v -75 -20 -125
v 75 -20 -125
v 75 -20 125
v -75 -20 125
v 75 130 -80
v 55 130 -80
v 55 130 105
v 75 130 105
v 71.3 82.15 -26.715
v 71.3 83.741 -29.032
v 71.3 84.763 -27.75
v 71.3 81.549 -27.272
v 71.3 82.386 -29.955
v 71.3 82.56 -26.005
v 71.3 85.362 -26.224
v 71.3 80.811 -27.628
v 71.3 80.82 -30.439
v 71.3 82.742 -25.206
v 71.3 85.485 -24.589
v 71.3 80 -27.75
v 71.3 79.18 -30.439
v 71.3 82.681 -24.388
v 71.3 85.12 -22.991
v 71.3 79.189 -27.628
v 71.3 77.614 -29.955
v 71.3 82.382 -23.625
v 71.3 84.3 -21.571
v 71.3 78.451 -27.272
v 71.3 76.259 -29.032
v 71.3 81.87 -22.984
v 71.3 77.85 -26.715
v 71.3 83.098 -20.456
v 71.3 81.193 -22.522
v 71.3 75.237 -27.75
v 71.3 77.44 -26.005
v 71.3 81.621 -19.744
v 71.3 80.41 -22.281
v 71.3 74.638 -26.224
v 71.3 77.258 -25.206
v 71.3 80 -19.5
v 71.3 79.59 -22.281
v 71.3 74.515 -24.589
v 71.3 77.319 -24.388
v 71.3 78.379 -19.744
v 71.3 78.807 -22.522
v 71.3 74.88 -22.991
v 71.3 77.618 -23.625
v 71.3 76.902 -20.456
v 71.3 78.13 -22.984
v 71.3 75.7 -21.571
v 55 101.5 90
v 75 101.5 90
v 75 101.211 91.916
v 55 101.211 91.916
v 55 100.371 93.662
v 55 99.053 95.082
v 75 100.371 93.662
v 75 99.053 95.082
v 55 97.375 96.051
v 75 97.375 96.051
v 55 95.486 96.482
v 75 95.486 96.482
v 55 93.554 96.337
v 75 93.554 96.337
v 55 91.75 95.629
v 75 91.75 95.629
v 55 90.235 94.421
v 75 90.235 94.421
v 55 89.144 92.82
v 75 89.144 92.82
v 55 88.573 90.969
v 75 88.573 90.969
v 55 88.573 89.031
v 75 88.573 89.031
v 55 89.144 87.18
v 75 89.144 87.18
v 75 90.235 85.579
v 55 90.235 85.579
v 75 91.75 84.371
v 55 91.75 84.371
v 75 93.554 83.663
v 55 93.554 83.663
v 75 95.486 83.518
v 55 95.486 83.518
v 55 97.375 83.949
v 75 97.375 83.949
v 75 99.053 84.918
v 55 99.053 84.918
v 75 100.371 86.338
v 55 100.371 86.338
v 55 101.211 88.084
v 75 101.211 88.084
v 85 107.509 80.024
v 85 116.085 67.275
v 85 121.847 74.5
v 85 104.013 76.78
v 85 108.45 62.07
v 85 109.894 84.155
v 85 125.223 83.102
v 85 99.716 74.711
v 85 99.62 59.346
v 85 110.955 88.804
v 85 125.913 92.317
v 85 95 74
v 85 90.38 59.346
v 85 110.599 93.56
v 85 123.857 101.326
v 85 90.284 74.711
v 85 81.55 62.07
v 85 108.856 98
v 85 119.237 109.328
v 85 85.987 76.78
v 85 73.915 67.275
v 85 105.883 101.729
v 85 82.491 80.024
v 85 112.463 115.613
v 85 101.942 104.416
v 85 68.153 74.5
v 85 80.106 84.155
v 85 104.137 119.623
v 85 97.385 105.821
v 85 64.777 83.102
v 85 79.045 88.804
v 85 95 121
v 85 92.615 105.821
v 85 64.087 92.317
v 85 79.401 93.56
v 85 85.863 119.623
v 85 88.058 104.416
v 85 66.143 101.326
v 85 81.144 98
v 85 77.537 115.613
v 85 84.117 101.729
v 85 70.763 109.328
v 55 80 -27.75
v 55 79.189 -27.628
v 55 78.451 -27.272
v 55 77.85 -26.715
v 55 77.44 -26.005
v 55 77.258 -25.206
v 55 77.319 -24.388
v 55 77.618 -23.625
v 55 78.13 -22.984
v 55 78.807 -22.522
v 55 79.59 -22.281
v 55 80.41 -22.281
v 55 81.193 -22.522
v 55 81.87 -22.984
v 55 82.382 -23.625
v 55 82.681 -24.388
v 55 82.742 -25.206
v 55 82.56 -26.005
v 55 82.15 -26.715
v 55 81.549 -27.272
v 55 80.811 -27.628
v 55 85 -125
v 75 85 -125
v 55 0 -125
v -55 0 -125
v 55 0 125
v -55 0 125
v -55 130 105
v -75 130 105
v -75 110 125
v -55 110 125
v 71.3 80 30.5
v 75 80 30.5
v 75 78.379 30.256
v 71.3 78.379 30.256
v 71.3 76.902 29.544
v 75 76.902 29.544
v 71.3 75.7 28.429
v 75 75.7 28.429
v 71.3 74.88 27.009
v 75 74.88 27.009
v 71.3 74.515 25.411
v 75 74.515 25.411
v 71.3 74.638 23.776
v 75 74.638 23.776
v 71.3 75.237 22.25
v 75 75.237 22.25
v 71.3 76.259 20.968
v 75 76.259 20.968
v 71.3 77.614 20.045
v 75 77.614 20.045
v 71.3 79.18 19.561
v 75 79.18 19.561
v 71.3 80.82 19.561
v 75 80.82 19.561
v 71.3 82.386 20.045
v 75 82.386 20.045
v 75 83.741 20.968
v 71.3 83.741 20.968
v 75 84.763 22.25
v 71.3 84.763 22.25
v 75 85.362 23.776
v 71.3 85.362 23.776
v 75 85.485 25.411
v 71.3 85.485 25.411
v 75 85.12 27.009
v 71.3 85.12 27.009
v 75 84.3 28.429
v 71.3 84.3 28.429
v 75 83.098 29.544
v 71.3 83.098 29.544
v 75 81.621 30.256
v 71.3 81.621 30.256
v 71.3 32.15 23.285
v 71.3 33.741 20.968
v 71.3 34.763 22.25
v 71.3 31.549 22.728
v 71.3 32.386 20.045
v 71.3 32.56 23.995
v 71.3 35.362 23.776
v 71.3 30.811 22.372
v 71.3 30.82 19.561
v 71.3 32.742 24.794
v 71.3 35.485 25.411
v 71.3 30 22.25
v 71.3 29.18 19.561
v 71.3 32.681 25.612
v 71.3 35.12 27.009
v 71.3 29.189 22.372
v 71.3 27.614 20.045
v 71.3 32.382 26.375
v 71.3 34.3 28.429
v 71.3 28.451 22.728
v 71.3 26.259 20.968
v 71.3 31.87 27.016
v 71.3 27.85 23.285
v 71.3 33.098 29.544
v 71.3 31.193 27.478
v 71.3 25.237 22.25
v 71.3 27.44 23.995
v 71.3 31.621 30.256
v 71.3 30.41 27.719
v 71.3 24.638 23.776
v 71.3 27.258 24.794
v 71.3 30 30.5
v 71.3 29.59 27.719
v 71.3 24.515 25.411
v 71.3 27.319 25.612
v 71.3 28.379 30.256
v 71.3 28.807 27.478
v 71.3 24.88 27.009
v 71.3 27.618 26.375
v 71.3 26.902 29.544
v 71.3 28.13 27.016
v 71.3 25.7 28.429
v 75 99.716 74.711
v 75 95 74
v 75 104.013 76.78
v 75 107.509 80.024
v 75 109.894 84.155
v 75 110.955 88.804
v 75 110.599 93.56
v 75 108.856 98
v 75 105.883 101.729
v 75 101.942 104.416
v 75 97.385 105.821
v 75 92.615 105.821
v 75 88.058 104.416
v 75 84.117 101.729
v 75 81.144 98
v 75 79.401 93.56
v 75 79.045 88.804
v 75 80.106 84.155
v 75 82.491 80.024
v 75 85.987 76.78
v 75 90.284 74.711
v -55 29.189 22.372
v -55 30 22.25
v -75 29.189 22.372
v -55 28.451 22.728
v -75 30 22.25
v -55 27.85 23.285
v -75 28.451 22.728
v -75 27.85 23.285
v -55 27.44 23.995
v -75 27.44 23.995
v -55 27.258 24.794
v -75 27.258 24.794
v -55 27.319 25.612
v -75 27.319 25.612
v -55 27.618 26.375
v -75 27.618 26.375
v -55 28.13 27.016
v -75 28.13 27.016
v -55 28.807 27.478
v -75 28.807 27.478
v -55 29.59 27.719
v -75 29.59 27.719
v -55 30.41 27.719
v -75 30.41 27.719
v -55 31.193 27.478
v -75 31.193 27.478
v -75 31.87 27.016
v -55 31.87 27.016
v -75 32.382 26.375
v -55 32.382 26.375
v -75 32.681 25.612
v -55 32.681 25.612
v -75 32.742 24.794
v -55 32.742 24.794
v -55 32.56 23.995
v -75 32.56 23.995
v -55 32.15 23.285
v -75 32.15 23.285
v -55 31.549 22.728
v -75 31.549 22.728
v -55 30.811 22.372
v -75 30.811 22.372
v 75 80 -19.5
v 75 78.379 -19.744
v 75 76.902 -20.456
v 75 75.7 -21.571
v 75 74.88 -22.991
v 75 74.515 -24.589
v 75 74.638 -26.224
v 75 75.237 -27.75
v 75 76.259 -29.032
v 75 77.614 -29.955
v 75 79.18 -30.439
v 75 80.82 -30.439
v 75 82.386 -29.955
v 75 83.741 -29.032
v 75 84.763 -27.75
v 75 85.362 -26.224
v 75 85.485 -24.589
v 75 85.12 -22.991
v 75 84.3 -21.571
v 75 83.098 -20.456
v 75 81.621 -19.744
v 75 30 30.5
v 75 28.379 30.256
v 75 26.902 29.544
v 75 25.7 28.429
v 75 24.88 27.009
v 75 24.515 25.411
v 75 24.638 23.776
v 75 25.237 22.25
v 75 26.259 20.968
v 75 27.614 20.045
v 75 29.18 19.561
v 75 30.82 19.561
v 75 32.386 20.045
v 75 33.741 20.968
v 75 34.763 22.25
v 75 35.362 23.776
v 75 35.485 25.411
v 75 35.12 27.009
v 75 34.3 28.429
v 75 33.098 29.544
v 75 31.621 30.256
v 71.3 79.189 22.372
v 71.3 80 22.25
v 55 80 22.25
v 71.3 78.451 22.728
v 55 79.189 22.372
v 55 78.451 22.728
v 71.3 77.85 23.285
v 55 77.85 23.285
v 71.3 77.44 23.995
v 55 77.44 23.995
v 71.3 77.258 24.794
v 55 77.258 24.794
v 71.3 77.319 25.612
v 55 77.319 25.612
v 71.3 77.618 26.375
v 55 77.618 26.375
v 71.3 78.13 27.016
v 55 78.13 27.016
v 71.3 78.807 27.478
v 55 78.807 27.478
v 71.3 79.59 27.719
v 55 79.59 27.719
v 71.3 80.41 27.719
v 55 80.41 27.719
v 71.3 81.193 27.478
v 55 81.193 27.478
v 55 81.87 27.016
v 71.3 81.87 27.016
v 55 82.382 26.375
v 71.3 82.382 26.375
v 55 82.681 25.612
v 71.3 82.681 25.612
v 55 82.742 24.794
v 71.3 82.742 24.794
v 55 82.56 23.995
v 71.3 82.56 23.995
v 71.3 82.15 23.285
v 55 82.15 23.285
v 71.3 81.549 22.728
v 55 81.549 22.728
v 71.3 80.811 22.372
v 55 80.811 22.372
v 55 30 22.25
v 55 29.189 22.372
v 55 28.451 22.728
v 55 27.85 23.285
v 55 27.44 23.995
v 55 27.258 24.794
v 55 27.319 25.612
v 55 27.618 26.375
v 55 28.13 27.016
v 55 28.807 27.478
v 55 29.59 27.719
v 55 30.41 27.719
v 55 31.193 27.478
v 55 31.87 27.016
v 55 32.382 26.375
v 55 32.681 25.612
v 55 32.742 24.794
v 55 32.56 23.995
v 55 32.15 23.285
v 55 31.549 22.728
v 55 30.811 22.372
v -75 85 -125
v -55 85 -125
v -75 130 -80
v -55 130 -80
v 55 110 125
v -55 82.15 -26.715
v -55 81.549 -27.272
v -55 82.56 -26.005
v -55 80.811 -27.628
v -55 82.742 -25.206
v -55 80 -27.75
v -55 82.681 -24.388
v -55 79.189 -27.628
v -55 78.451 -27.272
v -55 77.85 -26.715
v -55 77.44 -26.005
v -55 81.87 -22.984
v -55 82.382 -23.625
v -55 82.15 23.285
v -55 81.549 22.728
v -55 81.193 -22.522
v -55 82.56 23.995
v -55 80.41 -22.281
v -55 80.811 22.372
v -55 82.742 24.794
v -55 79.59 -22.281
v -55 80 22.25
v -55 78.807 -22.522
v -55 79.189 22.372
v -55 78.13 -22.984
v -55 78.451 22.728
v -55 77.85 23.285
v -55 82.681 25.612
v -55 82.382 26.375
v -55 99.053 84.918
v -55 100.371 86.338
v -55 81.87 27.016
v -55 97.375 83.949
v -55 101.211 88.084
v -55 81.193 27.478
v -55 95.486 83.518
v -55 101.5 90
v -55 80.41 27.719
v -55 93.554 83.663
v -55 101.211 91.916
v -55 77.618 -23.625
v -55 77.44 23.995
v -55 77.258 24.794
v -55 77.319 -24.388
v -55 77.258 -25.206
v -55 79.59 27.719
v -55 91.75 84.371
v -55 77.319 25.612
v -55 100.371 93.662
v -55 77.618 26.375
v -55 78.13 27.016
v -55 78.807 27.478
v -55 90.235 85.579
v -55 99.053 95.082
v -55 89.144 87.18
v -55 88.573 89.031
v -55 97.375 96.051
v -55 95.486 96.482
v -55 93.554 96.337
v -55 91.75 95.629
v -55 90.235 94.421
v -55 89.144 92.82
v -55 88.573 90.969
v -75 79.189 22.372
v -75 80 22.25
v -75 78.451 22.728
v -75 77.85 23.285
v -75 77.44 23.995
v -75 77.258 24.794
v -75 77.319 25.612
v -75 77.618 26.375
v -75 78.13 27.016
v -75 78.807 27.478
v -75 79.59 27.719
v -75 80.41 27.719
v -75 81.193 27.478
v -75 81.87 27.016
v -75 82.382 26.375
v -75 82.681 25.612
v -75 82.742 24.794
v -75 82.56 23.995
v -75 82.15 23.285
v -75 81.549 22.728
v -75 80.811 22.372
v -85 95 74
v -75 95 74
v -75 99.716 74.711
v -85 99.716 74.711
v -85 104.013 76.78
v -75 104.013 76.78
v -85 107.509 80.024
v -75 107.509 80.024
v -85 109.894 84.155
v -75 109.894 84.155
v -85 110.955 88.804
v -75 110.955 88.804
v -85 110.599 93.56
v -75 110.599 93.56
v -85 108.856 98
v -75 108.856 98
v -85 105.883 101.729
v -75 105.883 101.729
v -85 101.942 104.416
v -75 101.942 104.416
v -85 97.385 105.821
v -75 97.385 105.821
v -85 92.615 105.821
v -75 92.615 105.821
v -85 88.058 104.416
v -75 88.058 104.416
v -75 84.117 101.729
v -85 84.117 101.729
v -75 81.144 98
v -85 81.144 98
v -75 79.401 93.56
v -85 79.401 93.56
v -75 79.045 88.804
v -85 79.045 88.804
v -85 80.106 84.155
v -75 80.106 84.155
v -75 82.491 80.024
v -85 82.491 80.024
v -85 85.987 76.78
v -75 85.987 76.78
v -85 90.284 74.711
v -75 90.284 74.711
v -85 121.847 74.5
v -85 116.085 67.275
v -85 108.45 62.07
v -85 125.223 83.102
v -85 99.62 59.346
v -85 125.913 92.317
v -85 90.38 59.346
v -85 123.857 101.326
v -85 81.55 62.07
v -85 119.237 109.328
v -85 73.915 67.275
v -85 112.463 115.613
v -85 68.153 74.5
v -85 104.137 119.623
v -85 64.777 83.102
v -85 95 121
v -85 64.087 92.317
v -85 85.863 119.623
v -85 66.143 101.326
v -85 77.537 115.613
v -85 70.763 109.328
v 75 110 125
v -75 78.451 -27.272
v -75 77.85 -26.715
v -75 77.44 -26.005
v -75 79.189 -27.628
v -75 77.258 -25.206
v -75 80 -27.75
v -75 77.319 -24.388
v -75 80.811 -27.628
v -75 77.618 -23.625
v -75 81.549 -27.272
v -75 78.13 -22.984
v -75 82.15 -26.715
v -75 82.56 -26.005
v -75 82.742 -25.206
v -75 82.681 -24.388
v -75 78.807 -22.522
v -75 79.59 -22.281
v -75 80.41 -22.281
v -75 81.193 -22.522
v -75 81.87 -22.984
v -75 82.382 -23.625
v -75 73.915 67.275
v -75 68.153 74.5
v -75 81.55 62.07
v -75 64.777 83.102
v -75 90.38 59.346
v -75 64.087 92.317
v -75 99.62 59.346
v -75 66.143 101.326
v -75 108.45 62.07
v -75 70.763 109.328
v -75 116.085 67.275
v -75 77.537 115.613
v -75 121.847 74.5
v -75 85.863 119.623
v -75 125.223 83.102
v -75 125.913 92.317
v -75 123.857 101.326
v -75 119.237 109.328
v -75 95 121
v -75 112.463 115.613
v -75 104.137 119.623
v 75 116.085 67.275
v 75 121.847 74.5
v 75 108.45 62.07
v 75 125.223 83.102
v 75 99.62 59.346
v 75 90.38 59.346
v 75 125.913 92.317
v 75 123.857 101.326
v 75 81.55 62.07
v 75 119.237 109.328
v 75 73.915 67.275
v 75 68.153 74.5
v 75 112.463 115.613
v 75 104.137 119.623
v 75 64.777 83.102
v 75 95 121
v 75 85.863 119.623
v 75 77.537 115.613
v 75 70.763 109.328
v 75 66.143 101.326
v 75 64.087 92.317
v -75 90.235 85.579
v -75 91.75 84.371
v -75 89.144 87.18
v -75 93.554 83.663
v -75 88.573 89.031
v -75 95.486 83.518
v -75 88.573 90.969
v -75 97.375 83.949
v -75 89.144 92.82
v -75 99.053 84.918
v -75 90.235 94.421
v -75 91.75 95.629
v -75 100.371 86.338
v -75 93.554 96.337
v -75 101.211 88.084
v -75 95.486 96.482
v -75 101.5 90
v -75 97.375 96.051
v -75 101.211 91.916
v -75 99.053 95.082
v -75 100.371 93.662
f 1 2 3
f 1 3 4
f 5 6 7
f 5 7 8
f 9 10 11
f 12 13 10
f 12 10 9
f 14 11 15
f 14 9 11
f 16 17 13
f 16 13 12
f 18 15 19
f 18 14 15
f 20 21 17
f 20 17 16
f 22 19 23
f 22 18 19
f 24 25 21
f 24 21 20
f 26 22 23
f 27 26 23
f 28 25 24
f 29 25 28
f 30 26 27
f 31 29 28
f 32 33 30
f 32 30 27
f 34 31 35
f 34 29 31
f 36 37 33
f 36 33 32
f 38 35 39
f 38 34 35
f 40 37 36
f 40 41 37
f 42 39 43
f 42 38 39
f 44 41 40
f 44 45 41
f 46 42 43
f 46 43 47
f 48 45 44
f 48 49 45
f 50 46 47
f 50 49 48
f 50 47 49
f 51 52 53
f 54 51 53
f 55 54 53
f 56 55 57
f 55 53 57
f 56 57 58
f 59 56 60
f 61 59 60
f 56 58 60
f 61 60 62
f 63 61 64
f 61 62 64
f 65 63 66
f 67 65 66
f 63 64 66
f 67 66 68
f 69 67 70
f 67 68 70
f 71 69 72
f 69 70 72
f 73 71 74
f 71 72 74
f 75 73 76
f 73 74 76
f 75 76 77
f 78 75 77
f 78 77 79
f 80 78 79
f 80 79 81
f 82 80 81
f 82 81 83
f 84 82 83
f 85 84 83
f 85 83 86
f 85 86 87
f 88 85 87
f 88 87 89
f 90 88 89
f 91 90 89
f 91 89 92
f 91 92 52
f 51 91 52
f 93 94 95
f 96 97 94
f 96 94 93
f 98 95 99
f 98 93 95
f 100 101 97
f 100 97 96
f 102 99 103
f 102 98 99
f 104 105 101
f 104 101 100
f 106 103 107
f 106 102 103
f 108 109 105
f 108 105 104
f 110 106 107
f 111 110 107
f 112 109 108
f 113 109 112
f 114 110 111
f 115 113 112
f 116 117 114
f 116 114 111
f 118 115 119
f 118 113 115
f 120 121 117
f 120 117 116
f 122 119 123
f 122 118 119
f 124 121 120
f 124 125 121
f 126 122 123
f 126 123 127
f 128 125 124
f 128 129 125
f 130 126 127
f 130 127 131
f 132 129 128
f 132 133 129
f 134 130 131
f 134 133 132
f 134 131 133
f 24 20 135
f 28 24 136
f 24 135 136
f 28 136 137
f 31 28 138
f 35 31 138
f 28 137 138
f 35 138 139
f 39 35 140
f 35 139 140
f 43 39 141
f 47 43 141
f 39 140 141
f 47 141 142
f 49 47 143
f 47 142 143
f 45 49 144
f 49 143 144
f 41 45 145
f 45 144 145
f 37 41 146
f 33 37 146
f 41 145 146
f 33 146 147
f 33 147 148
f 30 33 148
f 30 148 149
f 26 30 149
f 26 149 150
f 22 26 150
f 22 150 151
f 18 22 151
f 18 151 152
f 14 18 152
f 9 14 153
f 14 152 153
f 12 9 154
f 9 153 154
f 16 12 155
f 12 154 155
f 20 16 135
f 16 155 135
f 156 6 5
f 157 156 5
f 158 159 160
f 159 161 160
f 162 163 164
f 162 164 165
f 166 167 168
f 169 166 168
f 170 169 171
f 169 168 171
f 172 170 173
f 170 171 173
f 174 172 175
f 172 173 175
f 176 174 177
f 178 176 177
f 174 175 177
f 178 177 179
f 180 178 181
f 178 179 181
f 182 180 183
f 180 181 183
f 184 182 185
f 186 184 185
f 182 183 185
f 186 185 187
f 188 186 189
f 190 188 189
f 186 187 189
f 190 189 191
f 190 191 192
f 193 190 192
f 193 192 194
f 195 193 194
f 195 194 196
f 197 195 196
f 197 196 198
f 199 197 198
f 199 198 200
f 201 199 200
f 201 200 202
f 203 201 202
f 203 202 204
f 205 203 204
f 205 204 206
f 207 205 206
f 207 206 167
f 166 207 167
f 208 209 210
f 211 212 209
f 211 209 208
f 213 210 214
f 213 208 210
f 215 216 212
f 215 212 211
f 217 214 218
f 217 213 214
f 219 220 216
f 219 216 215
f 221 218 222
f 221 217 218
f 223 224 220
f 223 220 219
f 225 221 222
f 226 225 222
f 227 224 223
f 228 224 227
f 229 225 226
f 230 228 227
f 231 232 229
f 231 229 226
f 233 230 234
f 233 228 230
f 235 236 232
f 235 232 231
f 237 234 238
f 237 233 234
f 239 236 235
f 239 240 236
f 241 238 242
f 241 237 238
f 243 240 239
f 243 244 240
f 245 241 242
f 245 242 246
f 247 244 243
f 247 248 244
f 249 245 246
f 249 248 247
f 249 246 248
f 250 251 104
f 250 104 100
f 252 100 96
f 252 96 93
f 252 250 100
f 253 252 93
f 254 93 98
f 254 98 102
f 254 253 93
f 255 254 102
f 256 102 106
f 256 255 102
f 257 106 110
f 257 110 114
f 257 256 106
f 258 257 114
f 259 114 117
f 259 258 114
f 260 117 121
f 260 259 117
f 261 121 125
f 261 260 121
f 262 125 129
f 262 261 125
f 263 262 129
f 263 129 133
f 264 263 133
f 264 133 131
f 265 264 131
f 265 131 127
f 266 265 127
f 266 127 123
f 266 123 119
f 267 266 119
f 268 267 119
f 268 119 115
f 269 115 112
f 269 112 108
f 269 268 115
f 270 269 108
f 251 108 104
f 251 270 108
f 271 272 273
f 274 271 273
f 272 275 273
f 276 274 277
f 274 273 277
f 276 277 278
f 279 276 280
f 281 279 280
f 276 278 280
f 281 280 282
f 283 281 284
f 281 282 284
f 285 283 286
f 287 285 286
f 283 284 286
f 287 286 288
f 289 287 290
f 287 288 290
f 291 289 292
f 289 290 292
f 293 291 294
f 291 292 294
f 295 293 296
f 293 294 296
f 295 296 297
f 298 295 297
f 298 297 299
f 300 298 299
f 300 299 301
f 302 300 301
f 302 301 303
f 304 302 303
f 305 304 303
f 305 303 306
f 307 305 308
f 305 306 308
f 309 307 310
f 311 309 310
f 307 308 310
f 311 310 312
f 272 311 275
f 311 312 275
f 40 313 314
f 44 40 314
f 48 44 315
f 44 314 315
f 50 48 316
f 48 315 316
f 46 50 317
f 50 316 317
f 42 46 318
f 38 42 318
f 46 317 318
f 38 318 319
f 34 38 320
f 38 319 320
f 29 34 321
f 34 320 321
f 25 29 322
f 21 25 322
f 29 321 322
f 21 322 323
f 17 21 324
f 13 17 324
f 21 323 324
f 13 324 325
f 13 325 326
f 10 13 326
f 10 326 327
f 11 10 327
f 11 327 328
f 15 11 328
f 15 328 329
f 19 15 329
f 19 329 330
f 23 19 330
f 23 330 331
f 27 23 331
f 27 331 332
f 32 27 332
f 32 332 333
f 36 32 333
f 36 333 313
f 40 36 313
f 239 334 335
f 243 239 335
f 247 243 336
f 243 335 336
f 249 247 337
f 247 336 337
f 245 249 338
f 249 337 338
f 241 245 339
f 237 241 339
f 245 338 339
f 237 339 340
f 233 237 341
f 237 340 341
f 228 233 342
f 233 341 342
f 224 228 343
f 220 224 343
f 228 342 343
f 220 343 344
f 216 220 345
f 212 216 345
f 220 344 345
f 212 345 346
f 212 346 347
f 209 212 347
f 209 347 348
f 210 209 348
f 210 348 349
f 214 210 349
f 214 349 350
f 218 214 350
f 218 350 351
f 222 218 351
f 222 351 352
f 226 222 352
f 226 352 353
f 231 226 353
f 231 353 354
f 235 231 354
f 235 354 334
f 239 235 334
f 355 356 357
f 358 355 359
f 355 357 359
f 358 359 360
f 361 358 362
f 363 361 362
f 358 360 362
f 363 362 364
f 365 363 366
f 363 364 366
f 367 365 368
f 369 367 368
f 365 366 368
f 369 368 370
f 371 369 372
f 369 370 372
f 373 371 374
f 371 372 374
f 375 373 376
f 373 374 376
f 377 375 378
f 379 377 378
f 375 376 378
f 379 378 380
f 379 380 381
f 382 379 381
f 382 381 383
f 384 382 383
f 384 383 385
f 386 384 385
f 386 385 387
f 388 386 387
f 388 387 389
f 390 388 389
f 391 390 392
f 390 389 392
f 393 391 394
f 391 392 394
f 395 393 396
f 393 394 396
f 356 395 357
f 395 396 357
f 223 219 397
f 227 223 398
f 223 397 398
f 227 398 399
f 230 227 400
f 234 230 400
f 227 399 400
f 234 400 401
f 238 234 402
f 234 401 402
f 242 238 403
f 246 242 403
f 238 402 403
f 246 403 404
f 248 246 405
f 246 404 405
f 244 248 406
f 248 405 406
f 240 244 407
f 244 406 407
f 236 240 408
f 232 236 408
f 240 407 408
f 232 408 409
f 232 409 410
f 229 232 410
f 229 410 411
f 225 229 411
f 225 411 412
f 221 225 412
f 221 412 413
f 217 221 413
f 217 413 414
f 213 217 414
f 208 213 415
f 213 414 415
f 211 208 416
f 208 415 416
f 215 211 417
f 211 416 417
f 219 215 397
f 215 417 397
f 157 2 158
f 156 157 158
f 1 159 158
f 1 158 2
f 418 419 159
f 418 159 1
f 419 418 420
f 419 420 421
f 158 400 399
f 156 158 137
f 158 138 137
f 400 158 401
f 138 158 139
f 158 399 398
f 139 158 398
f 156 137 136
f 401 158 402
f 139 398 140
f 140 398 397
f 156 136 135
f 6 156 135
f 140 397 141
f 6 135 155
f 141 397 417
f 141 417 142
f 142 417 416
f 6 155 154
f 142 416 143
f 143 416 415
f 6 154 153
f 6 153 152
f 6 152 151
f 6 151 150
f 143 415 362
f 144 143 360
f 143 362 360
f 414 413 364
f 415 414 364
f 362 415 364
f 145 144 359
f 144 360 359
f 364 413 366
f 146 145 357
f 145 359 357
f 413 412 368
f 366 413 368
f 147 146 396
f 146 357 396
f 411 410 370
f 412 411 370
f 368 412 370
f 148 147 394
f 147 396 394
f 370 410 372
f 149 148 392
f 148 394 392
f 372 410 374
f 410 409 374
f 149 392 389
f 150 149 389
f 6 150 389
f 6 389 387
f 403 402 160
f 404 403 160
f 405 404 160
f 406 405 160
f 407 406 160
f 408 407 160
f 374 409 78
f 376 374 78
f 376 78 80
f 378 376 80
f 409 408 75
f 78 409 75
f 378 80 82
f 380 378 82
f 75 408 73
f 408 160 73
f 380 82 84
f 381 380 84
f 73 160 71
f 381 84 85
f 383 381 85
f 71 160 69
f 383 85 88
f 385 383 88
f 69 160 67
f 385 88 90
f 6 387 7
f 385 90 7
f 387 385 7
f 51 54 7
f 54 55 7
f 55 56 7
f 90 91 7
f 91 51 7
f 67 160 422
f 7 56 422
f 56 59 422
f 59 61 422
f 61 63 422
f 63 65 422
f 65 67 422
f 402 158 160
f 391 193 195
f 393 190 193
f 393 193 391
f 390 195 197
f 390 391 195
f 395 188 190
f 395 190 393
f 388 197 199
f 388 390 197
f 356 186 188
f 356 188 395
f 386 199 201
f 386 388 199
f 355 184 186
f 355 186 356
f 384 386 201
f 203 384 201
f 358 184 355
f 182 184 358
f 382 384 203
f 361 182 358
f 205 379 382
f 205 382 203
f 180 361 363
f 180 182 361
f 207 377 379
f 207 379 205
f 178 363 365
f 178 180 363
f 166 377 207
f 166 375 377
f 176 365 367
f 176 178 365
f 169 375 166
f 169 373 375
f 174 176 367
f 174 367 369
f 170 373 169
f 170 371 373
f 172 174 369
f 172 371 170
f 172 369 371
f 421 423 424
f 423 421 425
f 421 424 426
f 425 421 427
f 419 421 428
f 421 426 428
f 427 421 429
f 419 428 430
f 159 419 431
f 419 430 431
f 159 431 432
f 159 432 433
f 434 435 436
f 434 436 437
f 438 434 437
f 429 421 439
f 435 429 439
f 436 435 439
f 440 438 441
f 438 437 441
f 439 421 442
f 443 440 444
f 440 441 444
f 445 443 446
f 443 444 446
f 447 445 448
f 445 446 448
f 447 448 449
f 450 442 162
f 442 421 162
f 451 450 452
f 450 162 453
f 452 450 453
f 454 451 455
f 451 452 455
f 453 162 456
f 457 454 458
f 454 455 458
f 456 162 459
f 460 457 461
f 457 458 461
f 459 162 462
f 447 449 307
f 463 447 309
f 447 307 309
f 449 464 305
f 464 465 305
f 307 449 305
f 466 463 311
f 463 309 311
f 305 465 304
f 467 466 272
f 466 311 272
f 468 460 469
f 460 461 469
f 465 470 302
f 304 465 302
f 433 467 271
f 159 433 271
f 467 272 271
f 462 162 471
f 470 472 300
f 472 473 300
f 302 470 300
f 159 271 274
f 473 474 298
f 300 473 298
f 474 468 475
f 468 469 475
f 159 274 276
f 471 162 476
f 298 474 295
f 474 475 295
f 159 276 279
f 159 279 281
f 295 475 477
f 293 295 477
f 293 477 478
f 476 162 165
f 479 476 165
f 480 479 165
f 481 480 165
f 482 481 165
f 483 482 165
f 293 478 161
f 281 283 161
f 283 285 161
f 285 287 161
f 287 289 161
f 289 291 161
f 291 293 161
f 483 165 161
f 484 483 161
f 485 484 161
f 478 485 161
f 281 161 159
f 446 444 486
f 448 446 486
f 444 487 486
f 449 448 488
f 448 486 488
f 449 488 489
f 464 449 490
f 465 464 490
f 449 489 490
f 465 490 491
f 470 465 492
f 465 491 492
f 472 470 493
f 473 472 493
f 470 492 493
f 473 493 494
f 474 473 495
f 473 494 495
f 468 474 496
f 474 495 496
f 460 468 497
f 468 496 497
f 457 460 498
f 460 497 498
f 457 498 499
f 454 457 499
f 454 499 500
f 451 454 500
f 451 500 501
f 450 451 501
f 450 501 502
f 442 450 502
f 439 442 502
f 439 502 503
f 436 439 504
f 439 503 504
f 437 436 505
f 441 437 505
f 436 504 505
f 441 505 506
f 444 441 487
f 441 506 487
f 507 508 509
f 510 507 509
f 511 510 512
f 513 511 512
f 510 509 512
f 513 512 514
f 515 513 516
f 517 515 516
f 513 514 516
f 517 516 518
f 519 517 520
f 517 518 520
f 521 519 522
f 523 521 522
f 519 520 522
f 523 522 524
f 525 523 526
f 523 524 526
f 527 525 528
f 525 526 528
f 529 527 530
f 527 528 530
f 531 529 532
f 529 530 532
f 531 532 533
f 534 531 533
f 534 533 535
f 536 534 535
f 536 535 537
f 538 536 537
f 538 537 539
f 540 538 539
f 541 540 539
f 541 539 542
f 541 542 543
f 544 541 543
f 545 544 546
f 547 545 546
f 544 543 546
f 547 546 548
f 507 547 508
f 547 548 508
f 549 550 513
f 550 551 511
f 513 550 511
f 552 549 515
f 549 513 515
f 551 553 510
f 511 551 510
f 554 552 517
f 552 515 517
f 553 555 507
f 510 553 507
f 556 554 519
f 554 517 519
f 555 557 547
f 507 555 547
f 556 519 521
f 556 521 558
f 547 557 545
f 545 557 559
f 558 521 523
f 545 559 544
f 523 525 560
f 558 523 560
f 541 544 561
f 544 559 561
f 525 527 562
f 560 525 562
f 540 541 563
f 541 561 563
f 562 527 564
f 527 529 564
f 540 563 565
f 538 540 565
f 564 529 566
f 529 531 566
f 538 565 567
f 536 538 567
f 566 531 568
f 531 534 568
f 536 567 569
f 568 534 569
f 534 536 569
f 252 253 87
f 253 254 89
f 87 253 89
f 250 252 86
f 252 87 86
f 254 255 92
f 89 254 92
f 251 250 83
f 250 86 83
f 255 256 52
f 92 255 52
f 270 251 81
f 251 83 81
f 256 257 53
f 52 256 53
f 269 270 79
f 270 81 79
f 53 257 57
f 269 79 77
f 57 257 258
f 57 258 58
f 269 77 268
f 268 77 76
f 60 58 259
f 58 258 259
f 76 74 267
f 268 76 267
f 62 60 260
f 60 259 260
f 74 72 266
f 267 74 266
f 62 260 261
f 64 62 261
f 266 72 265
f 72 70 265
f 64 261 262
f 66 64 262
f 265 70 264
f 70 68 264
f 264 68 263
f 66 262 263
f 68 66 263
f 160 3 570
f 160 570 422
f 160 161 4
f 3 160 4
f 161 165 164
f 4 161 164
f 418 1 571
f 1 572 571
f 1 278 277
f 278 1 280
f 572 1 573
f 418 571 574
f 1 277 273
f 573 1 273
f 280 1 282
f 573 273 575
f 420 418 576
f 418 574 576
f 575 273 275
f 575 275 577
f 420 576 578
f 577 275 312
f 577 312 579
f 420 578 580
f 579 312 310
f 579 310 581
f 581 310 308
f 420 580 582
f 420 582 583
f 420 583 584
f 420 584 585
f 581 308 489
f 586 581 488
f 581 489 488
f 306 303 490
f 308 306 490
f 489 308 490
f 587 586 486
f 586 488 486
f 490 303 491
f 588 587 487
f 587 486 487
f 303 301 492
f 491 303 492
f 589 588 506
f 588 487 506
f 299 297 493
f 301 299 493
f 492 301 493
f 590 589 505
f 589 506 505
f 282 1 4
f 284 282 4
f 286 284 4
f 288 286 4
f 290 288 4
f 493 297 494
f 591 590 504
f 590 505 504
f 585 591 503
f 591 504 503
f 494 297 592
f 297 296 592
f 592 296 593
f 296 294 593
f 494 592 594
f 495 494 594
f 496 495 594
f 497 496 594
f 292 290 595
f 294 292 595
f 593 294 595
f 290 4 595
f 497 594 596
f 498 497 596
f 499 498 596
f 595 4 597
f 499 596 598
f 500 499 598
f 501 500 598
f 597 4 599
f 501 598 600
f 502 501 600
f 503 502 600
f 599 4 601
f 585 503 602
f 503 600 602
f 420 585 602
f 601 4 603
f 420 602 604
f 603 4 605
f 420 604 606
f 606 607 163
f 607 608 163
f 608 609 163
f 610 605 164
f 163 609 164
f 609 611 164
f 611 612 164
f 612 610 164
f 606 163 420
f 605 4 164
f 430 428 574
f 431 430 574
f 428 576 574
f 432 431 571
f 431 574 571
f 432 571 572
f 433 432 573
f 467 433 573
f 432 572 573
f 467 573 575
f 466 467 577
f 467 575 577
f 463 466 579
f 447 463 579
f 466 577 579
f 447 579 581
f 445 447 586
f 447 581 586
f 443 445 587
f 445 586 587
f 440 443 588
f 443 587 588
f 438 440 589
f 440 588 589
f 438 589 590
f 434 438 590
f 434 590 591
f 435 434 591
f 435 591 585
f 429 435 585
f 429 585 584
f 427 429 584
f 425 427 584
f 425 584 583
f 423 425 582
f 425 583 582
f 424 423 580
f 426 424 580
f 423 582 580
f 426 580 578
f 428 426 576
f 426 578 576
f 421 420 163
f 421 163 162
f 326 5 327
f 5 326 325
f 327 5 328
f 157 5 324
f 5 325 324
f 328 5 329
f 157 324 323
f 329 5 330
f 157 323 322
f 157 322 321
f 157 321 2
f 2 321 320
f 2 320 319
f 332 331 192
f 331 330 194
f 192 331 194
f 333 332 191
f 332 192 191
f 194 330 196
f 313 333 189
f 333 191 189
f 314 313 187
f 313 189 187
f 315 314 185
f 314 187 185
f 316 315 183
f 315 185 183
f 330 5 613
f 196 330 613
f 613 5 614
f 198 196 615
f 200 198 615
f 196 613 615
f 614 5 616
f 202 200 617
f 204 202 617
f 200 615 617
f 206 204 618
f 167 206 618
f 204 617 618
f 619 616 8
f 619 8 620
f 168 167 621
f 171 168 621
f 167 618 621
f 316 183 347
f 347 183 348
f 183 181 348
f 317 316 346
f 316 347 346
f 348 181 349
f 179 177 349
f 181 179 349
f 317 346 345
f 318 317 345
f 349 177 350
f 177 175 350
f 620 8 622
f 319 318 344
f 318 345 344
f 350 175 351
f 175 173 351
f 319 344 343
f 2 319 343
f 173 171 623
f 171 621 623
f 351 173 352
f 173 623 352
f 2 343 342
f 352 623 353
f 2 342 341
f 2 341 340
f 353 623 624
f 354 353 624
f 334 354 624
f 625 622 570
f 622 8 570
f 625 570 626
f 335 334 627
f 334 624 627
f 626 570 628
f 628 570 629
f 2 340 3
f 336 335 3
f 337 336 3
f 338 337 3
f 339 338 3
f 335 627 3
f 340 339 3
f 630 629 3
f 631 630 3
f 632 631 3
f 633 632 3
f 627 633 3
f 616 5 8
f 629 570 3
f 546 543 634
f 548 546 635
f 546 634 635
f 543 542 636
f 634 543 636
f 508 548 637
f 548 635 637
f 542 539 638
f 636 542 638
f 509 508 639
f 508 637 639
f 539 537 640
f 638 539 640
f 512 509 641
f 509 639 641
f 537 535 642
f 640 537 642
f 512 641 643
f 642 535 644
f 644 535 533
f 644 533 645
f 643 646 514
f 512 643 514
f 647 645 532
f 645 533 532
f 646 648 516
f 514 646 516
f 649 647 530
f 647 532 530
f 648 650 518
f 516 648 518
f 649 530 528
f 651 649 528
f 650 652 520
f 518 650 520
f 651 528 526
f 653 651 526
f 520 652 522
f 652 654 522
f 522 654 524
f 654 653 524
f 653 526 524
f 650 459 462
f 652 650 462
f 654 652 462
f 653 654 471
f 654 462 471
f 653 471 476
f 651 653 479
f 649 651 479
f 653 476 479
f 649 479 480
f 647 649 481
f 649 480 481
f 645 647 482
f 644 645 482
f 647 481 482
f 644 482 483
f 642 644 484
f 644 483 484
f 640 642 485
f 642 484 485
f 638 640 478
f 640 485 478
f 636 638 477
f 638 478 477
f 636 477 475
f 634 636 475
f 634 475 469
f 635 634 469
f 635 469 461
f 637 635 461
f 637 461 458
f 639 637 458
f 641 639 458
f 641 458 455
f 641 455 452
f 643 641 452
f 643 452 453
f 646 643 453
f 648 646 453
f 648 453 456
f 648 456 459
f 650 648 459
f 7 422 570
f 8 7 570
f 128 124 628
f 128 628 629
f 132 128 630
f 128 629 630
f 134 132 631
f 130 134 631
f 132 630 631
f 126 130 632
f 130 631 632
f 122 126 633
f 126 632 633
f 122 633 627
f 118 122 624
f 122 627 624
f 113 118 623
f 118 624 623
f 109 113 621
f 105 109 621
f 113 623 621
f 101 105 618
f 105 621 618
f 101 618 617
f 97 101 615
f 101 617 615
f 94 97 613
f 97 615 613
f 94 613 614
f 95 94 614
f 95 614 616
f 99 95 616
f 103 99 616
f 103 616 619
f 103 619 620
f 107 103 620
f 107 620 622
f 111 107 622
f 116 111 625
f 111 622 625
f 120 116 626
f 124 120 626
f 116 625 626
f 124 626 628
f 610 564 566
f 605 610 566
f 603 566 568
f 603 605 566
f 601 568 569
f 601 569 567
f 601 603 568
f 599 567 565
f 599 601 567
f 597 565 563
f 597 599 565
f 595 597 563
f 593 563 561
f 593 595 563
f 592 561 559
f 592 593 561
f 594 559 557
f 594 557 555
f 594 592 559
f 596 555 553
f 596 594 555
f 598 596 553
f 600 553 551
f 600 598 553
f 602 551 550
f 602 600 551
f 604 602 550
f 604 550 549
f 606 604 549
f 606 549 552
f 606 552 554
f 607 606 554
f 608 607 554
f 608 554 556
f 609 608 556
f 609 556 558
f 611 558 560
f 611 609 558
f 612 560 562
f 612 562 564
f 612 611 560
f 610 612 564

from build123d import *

# Parameters (mm, degrees)
SALIENTE_EXTRUIR1_DEPTH                              = 125
CROQUIS2_R                                           = 31
CROQUIS2_R_2                                         = 16
SALIENTE_EXTRUIR2_DEPTH                              = 10
CROQUIS4_R                                           = 6.5
CORTAR_EXTRUIR2_DEPTH                                = 161
CHAFL_N2_SIZE                                        = 20
CHAFL_N3_SIZE                                        = 45
REFRENTADO_PARA_TORNILLO_CON_CABEZA_TRON_D           = 5.5
REFRENTADO_PARA_TORNILLO_CON_CABEZA_TRON_CBORE_D     = 11
REFRENTADO_PARA_TORNILLO_CON_CABEZA_TRON_CBORE_DEPTH = 3.7


with BuildPart() as part:
    # Croquis1 → Saliente-Extruir1 (new body, symmetric)
    with BuildSketch(Plane.XY):
        Polygon((-55, 130), (-55, 0), (55, 0), (55, 130), (75, 130), (75, -20), (-75, -20), (-75, 130), align=None)
    extrude(amount=SALIENTE_EXTRUIR1_DEPTH, both=True)

    # Croquis2 → Saliente-Extruir2 (add)
    with BuildSketch(Plane(origin=(75, 0, 0), x_dir=(0, 0, -1), z_dir=(1, 0, 0))):
        with Locations(Location((-90, 95, 0), (0, 0, 180))):  # turned: the seam where the file's is
            Circle(CROQUIS2_R)
        with Locations((-90, 95)):
            Circle(CROQUIS2_R_2, mode=Mode.SUBTRACT)
    saliente_extruir2 = extrude(amount=SALIENTE_EXTRUIR2_DEPTH)

    # Simetría1: Saliente-Extruir2 across plane
    add(saliente_extruir2.mirror(Plane(origin=(0, 0, 0), x_dir=(0, 0, 1), z_dir=(1, 0, 0))))

    # Croquis4 → Cortar-Extruir2 (cut, through all)
    with BuildSketch(Plane(origin=(75, 0, 0), x_dir=(0, 0, -1), z_dir=(1, 0, 0))):
        with Locations(Location((-90, 95, 0), (0, 0, 90))):  # turned: the seam where the file's is
            Circle(CROQUIS4_R)
    extrude(amount=-CORTAR_EXTRUIR2_DEPTH, mode=Mode.SUBTRACT)

    # Chaflán2
    chafl_n2_edges = [part.edges().sort_by_distance(p)[0] for p in [
        (65, 130, 125),
        (-65, 130, 125),
    ]]
    chamfer(chafl_n2_edges, length=CHAFL_N2_SIZE)

    # Chaflán3
    chafl_n3_edges = [part.edges().sort_by_distance(p)[0] for p in [
        (-65, 130, -125),
        (65, 130, -125),
    ]]
    chamfer(chafl_n3_edges, length=CHAFL_N3_SIZE)

    # Refrentado para tornillo con cabeza troncocónica de M51 (through all)
    with Locations(Plane(origin=(75, 80, 25), x_dir=(0, 0, 1), z_dir=(1, 0, 0))):
        with Locations((0, 0), (-50, 0), (0, 50)):
            CounterBoreHole(REFRENTADO_PARA_TORNILLO_CON_CABEZA_TRON_D / 2, REFRENTADO_PARA_TORNILLO_CON_CABEZA_TRON_CBORE_D / 2, REFRENTADO_PARA_TORNILLO_CON_CABEZA_TRON_CBORE_DEPTH)


solid = part.part
